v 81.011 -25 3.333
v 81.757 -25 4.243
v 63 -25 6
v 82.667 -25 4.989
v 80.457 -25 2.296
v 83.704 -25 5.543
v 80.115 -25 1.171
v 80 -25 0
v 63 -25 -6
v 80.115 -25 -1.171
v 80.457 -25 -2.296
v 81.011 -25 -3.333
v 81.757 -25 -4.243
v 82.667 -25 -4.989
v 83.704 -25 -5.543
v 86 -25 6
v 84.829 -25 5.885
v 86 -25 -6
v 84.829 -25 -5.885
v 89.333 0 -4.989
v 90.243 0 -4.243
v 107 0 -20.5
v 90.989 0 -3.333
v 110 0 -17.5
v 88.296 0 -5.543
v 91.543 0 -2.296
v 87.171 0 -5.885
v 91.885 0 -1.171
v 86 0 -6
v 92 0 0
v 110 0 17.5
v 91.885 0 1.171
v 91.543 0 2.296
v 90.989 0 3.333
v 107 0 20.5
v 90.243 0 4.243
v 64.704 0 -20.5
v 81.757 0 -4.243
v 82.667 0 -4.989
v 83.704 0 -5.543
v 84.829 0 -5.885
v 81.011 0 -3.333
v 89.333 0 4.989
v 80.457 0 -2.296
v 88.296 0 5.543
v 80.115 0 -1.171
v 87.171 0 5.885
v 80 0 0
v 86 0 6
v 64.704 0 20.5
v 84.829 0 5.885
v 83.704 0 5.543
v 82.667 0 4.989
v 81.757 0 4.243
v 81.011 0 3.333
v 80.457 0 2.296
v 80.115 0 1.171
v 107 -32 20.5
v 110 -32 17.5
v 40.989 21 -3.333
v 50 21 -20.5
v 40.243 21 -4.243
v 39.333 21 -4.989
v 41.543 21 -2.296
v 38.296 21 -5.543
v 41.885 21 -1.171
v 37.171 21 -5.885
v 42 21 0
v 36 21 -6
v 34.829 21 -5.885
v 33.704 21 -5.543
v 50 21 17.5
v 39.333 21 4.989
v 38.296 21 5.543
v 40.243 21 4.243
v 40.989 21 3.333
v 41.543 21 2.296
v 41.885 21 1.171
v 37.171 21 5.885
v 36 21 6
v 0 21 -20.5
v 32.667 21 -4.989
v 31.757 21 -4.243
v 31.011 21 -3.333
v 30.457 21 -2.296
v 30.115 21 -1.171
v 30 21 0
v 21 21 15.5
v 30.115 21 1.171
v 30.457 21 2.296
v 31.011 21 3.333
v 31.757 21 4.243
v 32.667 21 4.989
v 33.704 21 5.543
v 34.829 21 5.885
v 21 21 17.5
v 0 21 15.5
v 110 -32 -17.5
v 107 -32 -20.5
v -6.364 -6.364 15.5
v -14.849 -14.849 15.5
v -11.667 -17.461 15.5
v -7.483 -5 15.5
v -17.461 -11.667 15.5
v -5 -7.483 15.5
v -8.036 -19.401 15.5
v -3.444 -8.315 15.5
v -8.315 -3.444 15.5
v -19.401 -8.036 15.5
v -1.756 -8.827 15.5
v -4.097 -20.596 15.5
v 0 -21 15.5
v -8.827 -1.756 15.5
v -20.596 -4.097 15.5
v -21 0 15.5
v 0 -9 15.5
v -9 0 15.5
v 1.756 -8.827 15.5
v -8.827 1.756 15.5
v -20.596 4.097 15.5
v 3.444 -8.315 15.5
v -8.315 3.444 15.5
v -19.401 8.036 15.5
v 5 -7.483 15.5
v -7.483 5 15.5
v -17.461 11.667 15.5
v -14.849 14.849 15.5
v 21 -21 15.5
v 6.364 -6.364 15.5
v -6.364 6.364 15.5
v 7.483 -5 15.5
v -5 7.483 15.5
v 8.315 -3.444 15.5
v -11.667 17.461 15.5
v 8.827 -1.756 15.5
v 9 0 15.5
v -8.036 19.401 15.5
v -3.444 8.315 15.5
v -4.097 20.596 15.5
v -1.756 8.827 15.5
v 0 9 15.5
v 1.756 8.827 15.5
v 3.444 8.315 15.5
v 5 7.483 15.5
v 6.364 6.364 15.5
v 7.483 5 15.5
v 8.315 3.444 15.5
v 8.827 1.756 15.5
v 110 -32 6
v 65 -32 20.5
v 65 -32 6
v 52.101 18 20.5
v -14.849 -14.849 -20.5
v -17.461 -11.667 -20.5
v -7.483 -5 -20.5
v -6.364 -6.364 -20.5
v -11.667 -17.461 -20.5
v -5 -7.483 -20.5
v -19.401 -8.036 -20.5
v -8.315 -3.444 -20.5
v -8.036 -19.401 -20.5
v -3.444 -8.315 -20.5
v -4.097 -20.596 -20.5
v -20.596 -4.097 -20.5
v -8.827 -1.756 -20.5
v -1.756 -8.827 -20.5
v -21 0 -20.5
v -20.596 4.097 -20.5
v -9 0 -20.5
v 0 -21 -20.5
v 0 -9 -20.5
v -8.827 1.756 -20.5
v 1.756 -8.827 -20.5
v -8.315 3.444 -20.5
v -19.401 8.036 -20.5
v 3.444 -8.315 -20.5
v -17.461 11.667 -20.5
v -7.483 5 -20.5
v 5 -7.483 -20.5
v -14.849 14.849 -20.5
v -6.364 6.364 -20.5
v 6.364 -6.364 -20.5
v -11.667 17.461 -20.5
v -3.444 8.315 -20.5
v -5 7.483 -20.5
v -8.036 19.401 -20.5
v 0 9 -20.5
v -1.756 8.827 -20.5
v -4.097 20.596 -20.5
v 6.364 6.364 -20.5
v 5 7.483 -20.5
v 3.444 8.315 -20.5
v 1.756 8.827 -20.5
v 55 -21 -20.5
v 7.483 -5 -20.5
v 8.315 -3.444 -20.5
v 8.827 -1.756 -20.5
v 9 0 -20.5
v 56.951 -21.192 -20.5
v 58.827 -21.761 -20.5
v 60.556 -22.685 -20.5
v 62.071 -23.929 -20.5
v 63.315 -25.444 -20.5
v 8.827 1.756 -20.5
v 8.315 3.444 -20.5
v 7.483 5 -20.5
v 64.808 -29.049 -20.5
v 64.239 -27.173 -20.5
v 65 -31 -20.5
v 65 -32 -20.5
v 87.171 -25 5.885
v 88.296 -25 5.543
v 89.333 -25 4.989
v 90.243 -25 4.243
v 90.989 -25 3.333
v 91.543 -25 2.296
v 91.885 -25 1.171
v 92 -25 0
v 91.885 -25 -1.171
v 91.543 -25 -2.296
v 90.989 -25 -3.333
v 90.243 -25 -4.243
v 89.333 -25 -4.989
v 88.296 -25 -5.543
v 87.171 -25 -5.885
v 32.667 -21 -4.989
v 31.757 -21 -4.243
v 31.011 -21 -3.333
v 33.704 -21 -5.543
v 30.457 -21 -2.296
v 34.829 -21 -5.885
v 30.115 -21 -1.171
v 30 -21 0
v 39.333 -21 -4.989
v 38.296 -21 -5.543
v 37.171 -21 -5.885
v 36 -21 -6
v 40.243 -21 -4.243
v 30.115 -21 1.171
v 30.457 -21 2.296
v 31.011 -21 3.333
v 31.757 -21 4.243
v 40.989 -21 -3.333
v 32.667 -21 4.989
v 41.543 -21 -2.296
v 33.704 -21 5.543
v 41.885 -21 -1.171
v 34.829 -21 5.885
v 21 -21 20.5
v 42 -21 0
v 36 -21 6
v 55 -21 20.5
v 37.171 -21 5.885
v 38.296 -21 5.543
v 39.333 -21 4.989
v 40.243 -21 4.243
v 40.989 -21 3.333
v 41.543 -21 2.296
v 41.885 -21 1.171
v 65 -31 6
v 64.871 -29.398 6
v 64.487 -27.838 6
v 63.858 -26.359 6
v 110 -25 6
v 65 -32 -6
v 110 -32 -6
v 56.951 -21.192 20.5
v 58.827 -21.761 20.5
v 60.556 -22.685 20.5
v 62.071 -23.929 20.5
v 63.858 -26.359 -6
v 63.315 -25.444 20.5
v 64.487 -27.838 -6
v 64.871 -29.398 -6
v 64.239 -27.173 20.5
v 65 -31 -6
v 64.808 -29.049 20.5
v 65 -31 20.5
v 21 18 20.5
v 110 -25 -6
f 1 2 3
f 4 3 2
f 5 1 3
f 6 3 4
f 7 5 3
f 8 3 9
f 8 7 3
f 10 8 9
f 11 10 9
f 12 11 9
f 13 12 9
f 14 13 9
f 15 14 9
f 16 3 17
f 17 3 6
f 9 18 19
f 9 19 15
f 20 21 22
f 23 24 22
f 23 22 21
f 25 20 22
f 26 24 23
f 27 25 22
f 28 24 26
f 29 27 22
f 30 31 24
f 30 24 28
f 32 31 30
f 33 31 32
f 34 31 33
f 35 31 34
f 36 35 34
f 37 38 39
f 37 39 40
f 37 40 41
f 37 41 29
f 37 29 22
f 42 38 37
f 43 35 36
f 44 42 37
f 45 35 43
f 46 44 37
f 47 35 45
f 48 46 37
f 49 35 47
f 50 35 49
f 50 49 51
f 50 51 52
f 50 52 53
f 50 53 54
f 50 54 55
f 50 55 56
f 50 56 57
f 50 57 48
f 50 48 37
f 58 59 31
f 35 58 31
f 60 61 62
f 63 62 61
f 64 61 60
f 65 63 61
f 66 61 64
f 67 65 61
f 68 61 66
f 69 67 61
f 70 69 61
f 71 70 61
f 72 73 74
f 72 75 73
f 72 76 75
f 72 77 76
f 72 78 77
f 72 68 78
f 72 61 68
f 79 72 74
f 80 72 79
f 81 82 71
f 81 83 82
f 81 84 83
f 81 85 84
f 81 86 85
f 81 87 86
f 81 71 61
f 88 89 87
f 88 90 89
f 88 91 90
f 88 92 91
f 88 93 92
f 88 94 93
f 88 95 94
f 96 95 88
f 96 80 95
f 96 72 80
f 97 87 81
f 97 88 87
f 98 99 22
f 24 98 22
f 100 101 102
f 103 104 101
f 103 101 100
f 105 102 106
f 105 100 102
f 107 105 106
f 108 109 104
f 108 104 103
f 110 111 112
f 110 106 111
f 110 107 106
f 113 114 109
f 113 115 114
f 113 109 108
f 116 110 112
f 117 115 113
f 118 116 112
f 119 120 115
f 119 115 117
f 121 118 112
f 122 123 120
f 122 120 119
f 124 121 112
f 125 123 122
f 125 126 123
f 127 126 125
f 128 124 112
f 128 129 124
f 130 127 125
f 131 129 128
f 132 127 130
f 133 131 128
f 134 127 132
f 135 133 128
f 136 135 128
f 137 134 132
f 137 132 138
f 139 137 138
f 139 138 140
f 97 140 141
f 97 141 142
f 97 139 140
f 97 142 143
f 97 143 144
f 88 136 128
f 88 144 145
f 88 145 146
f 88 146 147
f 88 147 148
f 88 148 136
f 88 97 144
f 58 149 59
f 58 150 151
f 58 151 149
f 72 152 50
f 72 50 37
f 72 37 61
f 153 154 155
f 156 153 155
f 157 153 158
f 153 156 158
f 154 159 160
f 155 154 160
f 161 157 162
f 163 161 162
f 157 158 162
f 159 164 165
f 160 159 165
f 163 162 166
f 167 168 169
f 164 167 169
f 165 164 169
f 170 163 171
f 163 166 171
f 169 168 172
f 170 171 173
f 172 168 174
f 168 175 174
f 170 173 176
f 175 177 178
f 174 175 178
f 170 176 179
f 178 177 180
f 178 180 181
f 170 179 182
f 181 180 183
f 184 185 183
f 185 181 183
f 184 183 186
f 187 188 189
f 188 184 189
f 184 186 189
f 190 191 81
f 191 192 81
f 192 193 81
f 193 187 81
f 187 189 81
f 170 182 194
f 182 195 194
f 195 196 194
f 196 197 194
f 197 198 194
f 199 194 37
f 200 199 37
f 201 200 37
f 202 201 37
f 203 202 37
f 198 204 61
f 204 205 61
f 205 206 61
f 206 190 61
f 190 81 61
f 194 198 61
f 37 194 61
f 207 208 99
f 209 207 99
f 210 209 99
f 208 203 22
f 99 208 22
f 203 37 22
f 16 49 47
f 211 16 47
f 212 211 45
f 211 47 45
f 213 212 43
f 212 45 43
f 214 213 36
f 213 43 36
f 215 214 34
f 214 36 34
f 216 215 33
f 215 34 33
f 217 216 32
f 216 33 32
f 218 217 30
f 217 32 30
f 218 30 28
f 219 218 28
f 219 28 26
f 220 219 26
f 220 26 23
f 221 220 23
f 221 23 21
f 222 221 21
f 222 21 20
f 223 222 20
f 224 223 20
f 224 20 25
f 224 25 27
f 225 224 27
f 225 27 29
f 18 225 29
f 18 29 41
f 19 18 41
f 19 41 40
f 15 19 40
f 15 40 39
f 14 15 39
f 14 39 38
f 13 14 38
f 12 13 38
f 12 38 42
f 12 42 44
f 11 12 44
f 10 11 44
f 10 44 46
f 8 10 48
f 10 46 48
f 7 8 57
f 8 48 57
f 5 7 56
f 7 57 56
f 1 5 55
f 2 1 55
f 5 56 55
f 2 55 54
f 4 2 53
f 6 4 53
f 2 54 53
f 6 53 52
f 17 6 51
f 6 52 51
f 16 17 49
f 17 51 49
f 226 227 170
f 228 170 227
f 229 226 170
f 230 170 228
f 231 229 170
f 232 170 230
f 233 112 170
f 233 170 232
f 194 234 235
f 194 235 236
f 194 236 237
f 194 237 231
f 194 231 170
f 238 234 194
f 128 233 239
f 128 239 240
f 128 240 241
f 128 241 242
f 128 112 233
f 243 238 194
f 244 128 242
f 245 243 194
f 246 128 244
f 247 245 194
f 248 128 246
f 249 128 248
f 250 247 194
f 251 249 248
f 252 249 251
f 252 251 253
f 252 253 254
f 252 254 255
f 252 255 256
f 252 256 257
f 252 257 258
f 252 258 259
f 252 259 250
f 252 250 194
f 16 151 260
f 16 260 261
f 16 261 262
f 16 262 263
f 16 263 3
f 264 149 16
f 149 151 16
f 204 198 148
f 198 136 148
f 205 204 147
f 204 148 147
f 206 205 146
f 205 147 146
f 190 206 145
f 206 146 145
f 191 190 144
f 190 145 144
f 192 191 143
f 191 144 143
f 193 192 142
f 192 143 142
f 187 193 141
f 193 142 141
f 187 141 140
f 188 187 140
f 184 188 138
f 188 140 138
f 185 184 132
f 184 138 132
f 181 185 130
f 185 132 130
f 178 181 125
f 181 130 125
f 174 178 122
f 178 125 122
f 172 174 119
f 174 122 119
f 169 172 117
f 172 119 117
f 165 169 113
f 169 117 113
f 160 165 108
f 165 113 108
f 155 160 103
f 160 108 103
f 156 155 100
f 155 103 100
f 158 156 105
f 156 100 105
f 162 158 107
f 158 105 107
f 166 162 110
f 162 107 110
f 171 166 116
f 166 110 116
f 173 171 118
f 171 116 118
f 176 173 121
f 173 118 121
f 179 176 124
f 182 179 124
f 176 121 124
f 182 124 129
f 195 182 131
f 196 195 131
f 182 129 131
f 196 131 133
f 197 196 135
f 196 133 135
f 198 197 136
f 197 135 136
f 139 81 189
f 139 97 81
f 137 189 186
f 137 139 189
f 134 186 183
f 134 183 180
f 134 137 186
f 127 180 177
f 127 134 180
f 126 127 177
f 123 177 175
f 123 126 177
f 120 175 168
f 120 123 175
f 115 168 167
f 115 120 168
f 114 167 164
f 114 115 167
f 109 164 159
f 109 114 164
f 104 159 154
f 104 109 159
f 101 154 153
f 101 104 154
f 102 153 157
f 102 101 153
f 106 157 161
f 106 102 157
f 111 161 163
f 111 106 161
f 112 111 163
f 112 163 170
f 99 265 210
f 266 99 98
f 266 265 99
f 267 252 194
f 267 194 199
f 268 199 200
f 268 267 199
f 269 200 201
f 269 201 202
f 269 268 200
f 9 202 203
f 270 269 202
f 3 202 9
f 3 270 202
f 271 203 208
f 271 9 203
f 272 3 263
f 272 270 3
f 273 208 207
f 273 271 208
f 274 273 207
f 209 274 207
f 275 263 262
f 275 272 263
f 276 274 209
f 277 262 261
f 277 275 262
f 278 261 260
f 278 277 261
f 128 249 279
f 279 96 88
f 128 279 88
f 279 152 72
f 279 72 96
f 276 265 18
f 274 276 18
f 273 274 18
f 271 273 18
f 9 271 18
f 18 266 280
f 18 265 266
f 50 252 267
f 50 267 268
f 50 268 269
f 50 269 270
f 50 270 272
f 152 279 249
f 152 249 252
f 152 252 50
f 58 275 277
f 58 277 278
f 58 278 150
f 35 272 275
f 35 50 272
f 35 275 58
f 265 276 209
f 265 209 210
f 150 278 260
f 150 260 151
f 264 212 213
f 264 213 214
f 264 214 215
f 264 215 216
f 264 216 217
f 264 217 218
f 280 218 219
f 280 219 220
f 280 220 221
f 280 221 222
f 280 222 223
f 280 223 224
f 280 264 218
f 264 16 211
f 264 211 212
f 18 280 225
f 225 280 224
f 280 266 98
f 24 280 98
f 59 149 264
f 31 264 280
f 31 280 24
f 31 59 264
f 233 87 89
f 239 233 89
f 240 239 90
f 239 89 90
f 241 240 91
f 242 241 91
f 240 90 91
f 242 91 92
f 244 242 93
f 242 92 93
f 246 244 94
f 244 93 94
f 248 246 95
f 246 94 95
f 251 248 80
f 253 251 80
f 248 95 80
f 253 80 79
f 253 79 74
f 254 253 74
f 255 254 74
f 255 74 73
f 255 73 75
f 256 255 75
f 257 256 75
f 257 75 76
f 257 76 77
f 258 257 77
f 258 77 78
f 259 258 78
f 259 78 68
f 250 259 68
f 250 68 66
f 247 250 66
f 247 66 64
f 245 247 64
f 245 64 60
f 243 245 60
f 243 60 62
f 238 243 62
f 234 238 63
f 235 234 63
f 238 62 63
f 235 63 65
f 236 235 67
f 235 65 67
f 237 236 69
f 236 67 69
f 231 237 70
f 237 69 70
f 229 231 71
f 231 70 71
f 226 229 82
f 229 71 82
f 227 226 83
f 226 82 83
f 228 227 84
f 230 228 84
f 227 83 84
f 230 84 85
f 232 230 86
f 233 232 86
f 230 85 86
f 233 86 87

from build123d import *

# Parameters (mm, degrees)
SKETCH1_R           = 21
SKETCH1_R_2         = 9
BOSS_EXTRUDE1_DEPTH = 20.5
SKETCH2_R           = 6
SKETCH2_W           = 42
SKETCH2_H           = 5
CUT_EXTRUDE1_DEPTH  = 55
SKETCH3_W           = 12
SKETCH3_H           = 7
CUT_EXTRUDE2_DEPTH  = 55
CHAMFER1_SIZE       = 3


with BuildPart() as part:
    # Sketch1 → Boss-Extrude1 (new, symmetric)
    # profile 1 of 2: a face of its own
    with BuildSketch(Plane.XY):
        with BuildLine():
            Line((50, 21), (0, 21))
            ThreePointArc((0, 21), (14.849242405, 14.849242405), (21, 0))
            ThreePointArc((21, 0), (14.849242405, -14.849242405), (0, -21))
            Line((0, -21), (55, -21))
            ThreePointArc((55, -21), (62.071067812, -23.928932188), (65, -31))
            Line((65, -31), (65, -32))
            Line((65, -32), (110, -32))
            Line((110, -32), (110, 0))
            Line((110, 0), (64.704358302, 0))
            Line((64.704358302, 0), (50, 21))
        make_face()
    # profile 2 of 2: a face of its own
    with BuildSketch(Plane.XY):
        Circle(SKETCH1_R)
        Circle(SKETCH1_R_2, mode=Mode.SUBTRACT)
    extrude(amount=BOSS_EXTRUDE1_DEPTH, both=True)

    # Sketch2 → Cut-Extrude1 (cut)
    with BuildSketch(Plane(origin=(0, 21, 0), x_dir=(1, 0, 0), z_dir=(0, 1, 0))):
        with Locations(Location((36, 0, 0), (0, 0, 180))):
            Circle(SKETCH2_R)
        with Locations(Location((86, 0, 0), (0, 0, 270))):
            Circle(SKETCH2_R)
        with Locations((0, -18)):
            Rectangle(SKETCH2_W, SKETCH2_H)
    extrude(amount=-CUT_EXTRUDE1_DEPTH, mode=Mode.SUBTRACT)

    # Sketch3 → Cut-Extrude2 (cut)
    with BuildSketch(Plane(origin=(110, 0, 0), x_dir=(0, 0, -1), z_dir=(1, 0, 0))):
        with Locations((0, -28.5)):
            Rectangle(SKETCH3_W, SKETCH3_H)
    extrude(amount=-CUT_EXTRUDE2_DEPTH, mode=Mode.SUBTRACT)

    # Chamfer1
    chamfer1_edges = [part.edges().sort_by_distance(p)[0] for p in [
        (110, -16, -20.5),
        (110, -16, 20.5),
        (35.5, 21, 20.5),
    ]]
    chamfer(chamfer1_edges, length=CHAMFER1_SIZE)


solid = part.part
